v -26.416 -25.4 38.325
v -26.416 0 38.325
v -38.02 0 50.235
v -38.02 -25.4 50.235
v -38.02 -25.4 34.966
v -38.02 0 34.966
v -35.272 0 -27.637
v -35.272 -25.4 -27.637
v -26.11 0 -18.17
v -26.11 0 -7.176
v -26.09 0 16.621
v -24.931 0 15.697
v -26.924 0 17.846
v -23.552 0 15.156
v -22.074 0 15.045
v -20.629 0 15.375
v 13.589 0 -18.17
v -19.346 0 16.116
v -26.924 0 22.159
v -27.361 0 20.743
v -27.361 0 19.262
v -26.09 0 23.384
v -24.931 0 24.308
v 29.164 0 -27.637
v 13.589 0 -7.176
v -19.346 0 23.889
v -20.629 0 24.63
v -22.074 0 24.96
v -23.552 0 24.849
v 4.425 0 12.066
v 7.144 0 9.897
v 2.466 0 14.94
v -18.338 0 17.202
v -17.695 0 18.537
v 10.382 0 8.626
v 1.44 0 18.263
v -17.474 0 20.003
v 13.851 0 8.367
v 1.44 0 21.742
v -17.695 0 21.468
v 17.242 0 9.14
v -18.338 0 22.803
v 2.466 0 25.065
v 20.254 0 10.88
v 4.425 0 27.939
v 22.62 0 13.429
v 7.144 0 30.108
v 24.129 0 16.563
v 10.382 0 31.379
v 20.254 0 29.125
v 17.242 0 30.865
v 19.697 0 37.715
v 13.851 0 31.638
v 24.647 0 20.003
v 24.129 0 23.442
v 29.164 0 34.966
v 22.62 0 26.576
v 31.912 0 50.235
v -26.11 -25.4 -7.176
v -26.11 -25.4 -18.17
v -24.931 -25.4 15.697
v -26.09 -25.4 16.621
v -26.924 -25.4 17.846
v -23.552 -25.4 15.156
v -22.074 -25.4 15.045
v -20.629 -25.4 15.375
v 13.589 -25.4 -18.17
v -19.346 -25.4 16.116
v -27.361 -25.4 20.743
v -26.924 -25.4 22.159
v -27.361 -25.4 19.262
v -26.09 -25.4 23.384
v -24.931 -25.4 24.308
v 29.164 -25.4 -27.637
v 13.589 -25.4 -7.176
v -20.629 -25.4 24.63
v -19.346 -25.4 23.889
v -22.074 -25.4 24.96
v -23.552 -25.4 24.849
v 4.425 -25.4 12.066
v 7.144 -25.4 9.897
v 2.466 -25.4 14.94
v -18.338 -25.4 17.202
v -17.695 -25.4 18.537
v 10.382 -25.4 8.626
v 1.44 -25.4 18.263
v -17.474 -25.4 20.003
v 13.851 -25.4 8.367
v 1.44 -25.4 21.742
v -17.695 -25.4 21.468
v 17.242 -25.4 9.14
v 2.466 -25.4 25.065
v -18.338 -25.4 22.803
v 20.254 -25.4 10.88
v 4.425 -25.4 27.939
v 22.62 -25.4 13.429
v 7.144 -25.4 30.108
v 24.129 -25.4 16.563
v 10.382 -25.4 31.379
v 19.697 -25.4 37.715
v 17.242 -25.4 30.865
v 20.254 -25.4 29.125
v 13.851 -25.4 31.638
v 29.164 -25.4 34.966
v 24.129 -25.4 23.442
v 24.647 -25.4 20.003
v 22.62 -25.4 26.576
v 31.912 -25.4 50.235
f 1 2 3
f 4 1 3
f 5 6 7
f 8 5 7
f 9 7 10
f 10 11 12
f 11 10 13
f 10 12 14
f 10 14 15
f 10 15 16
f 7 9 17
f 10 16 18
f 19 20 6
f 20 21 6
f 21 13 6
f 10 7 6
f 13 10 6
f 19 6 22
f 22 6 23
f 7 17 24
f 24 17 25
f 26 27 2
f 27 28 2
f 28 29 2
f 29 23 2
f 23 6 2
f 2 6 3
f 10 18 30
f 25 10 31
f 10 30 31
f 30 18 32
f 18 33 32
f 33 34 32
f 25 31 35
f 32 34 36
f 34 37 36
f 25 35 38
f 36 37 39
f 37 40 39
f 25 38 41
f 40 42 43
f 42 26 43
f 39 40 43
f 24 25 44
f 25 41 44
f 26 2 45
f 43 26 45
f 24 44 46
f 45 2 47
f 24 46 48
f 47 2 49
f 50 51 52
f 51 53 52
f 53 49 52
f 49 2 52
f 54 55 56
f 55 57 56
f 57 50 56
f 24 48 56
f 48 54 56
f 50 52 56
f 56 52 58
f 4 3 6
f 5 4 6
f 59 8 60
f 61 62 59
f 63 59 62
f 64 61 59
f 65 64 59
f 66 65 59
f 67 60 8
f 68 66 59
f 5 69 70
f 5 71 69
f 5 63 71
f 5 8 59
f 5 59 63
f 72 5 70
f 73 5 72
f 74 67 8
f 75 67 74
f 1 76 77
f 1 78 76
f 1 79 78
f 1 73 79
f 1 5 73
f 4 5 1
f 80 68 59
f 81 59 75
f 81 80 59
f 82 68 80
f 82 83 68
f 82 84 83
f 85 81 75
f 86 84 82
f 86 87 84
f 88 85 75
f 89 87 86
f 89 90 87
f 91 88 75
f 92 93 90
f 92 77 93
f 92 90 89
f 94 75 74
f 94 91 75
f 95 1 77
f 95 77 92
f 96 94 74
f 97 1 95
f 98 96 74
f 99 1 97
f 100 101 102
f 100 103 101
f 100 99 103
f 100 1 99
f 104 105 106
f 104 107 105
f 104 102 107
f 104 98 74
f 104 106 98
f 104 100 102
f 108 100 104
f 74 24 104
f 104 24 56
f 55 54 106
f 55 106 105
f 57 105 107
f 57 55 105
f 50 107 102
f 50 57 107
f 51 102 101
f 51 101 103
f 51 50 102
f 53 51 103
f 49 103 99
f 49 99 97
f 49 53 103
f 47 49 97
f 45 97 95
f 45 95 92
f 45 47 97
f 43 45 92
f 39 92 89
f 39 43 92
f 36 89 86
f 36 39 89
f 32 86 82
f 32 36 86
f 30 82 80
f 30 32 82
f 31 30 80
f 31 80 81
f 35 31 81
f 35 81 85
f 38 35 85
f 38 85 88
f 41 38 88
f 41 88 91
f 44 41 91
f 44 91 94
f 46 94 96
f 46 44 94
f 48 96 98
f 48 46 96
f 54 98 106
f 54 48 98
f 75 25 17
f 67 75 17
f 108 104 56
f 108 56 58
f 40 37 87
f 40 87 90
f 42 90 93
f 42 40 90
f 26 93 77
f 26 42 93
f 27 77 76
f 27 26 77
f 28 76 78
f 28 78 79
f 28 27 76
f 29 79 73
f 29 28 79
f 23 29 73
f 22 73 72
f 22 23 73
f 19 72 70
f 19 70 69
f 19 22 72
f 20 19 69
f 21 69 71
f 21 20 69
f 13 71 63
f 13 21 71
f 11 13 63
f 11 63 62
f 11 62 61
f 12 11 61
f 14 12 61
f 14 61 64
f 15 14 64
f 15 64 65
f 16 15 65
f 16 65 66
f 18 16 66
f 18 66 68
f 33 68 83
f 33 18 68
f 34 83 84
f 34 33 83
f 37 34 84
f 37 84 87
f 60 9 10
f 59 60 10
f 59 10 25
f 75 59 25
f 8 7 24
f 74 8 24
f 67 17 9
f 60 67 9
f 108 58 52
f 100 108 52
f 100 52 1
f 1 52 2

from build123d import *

# Parameters (mm, degrees)
F0_R     = 4.971253
F0_R_2   = 11.668616
F1_DEPTH = 25.4


with BuildPart() as f1:
    # F0 (on Front) → F1 (new body)
    with BuildSketch(Plane.XZ):
        Polygon((19.697119, 37.714638), (-26.415516, 38.325403), (-38.020018, 50.235286), (-38.020018, 34.966201), (-35.271585, -27.637042), (29.163949, -27.637042), (29.163949, 34.966201), (31.912383, 50.235286), align=None)
        Polygon((-26.110133, -12.67334), (-26.110133, -7.17647), (-21.224027, -7.17647), (-16.33792, -7.17647), (-12.062577, -7.17647), (-6.260324, -7.17647), (-2.901126, -7.17647), (2.290364, -7.17647), (6.260325, -7.17647), (9.314141, -7.17647), (13.589485, -7.17647), (13.589485, -12.67334), (13.589485, -18.17021), (9.314141, -18.17021), (6.260325, -18.17021), (2.290364, -18.17021), (-2.901126, -18.17021), (-6.260324, -18.17021), (-12.062577, -18.17021), (-16.33792, -18.17021), (-21.224027, -18.17021), (-26.110133, -18.17021), align=None, mode=Mode.SUBTRACT)
        with Locations((-22.445554, 20.002501)):
            Circle(F0_R, mode=Mode.SUBTRACT)
        with Locations((12.97872, 20.002501)):
            Circle(F0_R_2, mode=Mode.SUBTRACT)
    extrude(amount=F1_DEPTH)


solid = f1.part
